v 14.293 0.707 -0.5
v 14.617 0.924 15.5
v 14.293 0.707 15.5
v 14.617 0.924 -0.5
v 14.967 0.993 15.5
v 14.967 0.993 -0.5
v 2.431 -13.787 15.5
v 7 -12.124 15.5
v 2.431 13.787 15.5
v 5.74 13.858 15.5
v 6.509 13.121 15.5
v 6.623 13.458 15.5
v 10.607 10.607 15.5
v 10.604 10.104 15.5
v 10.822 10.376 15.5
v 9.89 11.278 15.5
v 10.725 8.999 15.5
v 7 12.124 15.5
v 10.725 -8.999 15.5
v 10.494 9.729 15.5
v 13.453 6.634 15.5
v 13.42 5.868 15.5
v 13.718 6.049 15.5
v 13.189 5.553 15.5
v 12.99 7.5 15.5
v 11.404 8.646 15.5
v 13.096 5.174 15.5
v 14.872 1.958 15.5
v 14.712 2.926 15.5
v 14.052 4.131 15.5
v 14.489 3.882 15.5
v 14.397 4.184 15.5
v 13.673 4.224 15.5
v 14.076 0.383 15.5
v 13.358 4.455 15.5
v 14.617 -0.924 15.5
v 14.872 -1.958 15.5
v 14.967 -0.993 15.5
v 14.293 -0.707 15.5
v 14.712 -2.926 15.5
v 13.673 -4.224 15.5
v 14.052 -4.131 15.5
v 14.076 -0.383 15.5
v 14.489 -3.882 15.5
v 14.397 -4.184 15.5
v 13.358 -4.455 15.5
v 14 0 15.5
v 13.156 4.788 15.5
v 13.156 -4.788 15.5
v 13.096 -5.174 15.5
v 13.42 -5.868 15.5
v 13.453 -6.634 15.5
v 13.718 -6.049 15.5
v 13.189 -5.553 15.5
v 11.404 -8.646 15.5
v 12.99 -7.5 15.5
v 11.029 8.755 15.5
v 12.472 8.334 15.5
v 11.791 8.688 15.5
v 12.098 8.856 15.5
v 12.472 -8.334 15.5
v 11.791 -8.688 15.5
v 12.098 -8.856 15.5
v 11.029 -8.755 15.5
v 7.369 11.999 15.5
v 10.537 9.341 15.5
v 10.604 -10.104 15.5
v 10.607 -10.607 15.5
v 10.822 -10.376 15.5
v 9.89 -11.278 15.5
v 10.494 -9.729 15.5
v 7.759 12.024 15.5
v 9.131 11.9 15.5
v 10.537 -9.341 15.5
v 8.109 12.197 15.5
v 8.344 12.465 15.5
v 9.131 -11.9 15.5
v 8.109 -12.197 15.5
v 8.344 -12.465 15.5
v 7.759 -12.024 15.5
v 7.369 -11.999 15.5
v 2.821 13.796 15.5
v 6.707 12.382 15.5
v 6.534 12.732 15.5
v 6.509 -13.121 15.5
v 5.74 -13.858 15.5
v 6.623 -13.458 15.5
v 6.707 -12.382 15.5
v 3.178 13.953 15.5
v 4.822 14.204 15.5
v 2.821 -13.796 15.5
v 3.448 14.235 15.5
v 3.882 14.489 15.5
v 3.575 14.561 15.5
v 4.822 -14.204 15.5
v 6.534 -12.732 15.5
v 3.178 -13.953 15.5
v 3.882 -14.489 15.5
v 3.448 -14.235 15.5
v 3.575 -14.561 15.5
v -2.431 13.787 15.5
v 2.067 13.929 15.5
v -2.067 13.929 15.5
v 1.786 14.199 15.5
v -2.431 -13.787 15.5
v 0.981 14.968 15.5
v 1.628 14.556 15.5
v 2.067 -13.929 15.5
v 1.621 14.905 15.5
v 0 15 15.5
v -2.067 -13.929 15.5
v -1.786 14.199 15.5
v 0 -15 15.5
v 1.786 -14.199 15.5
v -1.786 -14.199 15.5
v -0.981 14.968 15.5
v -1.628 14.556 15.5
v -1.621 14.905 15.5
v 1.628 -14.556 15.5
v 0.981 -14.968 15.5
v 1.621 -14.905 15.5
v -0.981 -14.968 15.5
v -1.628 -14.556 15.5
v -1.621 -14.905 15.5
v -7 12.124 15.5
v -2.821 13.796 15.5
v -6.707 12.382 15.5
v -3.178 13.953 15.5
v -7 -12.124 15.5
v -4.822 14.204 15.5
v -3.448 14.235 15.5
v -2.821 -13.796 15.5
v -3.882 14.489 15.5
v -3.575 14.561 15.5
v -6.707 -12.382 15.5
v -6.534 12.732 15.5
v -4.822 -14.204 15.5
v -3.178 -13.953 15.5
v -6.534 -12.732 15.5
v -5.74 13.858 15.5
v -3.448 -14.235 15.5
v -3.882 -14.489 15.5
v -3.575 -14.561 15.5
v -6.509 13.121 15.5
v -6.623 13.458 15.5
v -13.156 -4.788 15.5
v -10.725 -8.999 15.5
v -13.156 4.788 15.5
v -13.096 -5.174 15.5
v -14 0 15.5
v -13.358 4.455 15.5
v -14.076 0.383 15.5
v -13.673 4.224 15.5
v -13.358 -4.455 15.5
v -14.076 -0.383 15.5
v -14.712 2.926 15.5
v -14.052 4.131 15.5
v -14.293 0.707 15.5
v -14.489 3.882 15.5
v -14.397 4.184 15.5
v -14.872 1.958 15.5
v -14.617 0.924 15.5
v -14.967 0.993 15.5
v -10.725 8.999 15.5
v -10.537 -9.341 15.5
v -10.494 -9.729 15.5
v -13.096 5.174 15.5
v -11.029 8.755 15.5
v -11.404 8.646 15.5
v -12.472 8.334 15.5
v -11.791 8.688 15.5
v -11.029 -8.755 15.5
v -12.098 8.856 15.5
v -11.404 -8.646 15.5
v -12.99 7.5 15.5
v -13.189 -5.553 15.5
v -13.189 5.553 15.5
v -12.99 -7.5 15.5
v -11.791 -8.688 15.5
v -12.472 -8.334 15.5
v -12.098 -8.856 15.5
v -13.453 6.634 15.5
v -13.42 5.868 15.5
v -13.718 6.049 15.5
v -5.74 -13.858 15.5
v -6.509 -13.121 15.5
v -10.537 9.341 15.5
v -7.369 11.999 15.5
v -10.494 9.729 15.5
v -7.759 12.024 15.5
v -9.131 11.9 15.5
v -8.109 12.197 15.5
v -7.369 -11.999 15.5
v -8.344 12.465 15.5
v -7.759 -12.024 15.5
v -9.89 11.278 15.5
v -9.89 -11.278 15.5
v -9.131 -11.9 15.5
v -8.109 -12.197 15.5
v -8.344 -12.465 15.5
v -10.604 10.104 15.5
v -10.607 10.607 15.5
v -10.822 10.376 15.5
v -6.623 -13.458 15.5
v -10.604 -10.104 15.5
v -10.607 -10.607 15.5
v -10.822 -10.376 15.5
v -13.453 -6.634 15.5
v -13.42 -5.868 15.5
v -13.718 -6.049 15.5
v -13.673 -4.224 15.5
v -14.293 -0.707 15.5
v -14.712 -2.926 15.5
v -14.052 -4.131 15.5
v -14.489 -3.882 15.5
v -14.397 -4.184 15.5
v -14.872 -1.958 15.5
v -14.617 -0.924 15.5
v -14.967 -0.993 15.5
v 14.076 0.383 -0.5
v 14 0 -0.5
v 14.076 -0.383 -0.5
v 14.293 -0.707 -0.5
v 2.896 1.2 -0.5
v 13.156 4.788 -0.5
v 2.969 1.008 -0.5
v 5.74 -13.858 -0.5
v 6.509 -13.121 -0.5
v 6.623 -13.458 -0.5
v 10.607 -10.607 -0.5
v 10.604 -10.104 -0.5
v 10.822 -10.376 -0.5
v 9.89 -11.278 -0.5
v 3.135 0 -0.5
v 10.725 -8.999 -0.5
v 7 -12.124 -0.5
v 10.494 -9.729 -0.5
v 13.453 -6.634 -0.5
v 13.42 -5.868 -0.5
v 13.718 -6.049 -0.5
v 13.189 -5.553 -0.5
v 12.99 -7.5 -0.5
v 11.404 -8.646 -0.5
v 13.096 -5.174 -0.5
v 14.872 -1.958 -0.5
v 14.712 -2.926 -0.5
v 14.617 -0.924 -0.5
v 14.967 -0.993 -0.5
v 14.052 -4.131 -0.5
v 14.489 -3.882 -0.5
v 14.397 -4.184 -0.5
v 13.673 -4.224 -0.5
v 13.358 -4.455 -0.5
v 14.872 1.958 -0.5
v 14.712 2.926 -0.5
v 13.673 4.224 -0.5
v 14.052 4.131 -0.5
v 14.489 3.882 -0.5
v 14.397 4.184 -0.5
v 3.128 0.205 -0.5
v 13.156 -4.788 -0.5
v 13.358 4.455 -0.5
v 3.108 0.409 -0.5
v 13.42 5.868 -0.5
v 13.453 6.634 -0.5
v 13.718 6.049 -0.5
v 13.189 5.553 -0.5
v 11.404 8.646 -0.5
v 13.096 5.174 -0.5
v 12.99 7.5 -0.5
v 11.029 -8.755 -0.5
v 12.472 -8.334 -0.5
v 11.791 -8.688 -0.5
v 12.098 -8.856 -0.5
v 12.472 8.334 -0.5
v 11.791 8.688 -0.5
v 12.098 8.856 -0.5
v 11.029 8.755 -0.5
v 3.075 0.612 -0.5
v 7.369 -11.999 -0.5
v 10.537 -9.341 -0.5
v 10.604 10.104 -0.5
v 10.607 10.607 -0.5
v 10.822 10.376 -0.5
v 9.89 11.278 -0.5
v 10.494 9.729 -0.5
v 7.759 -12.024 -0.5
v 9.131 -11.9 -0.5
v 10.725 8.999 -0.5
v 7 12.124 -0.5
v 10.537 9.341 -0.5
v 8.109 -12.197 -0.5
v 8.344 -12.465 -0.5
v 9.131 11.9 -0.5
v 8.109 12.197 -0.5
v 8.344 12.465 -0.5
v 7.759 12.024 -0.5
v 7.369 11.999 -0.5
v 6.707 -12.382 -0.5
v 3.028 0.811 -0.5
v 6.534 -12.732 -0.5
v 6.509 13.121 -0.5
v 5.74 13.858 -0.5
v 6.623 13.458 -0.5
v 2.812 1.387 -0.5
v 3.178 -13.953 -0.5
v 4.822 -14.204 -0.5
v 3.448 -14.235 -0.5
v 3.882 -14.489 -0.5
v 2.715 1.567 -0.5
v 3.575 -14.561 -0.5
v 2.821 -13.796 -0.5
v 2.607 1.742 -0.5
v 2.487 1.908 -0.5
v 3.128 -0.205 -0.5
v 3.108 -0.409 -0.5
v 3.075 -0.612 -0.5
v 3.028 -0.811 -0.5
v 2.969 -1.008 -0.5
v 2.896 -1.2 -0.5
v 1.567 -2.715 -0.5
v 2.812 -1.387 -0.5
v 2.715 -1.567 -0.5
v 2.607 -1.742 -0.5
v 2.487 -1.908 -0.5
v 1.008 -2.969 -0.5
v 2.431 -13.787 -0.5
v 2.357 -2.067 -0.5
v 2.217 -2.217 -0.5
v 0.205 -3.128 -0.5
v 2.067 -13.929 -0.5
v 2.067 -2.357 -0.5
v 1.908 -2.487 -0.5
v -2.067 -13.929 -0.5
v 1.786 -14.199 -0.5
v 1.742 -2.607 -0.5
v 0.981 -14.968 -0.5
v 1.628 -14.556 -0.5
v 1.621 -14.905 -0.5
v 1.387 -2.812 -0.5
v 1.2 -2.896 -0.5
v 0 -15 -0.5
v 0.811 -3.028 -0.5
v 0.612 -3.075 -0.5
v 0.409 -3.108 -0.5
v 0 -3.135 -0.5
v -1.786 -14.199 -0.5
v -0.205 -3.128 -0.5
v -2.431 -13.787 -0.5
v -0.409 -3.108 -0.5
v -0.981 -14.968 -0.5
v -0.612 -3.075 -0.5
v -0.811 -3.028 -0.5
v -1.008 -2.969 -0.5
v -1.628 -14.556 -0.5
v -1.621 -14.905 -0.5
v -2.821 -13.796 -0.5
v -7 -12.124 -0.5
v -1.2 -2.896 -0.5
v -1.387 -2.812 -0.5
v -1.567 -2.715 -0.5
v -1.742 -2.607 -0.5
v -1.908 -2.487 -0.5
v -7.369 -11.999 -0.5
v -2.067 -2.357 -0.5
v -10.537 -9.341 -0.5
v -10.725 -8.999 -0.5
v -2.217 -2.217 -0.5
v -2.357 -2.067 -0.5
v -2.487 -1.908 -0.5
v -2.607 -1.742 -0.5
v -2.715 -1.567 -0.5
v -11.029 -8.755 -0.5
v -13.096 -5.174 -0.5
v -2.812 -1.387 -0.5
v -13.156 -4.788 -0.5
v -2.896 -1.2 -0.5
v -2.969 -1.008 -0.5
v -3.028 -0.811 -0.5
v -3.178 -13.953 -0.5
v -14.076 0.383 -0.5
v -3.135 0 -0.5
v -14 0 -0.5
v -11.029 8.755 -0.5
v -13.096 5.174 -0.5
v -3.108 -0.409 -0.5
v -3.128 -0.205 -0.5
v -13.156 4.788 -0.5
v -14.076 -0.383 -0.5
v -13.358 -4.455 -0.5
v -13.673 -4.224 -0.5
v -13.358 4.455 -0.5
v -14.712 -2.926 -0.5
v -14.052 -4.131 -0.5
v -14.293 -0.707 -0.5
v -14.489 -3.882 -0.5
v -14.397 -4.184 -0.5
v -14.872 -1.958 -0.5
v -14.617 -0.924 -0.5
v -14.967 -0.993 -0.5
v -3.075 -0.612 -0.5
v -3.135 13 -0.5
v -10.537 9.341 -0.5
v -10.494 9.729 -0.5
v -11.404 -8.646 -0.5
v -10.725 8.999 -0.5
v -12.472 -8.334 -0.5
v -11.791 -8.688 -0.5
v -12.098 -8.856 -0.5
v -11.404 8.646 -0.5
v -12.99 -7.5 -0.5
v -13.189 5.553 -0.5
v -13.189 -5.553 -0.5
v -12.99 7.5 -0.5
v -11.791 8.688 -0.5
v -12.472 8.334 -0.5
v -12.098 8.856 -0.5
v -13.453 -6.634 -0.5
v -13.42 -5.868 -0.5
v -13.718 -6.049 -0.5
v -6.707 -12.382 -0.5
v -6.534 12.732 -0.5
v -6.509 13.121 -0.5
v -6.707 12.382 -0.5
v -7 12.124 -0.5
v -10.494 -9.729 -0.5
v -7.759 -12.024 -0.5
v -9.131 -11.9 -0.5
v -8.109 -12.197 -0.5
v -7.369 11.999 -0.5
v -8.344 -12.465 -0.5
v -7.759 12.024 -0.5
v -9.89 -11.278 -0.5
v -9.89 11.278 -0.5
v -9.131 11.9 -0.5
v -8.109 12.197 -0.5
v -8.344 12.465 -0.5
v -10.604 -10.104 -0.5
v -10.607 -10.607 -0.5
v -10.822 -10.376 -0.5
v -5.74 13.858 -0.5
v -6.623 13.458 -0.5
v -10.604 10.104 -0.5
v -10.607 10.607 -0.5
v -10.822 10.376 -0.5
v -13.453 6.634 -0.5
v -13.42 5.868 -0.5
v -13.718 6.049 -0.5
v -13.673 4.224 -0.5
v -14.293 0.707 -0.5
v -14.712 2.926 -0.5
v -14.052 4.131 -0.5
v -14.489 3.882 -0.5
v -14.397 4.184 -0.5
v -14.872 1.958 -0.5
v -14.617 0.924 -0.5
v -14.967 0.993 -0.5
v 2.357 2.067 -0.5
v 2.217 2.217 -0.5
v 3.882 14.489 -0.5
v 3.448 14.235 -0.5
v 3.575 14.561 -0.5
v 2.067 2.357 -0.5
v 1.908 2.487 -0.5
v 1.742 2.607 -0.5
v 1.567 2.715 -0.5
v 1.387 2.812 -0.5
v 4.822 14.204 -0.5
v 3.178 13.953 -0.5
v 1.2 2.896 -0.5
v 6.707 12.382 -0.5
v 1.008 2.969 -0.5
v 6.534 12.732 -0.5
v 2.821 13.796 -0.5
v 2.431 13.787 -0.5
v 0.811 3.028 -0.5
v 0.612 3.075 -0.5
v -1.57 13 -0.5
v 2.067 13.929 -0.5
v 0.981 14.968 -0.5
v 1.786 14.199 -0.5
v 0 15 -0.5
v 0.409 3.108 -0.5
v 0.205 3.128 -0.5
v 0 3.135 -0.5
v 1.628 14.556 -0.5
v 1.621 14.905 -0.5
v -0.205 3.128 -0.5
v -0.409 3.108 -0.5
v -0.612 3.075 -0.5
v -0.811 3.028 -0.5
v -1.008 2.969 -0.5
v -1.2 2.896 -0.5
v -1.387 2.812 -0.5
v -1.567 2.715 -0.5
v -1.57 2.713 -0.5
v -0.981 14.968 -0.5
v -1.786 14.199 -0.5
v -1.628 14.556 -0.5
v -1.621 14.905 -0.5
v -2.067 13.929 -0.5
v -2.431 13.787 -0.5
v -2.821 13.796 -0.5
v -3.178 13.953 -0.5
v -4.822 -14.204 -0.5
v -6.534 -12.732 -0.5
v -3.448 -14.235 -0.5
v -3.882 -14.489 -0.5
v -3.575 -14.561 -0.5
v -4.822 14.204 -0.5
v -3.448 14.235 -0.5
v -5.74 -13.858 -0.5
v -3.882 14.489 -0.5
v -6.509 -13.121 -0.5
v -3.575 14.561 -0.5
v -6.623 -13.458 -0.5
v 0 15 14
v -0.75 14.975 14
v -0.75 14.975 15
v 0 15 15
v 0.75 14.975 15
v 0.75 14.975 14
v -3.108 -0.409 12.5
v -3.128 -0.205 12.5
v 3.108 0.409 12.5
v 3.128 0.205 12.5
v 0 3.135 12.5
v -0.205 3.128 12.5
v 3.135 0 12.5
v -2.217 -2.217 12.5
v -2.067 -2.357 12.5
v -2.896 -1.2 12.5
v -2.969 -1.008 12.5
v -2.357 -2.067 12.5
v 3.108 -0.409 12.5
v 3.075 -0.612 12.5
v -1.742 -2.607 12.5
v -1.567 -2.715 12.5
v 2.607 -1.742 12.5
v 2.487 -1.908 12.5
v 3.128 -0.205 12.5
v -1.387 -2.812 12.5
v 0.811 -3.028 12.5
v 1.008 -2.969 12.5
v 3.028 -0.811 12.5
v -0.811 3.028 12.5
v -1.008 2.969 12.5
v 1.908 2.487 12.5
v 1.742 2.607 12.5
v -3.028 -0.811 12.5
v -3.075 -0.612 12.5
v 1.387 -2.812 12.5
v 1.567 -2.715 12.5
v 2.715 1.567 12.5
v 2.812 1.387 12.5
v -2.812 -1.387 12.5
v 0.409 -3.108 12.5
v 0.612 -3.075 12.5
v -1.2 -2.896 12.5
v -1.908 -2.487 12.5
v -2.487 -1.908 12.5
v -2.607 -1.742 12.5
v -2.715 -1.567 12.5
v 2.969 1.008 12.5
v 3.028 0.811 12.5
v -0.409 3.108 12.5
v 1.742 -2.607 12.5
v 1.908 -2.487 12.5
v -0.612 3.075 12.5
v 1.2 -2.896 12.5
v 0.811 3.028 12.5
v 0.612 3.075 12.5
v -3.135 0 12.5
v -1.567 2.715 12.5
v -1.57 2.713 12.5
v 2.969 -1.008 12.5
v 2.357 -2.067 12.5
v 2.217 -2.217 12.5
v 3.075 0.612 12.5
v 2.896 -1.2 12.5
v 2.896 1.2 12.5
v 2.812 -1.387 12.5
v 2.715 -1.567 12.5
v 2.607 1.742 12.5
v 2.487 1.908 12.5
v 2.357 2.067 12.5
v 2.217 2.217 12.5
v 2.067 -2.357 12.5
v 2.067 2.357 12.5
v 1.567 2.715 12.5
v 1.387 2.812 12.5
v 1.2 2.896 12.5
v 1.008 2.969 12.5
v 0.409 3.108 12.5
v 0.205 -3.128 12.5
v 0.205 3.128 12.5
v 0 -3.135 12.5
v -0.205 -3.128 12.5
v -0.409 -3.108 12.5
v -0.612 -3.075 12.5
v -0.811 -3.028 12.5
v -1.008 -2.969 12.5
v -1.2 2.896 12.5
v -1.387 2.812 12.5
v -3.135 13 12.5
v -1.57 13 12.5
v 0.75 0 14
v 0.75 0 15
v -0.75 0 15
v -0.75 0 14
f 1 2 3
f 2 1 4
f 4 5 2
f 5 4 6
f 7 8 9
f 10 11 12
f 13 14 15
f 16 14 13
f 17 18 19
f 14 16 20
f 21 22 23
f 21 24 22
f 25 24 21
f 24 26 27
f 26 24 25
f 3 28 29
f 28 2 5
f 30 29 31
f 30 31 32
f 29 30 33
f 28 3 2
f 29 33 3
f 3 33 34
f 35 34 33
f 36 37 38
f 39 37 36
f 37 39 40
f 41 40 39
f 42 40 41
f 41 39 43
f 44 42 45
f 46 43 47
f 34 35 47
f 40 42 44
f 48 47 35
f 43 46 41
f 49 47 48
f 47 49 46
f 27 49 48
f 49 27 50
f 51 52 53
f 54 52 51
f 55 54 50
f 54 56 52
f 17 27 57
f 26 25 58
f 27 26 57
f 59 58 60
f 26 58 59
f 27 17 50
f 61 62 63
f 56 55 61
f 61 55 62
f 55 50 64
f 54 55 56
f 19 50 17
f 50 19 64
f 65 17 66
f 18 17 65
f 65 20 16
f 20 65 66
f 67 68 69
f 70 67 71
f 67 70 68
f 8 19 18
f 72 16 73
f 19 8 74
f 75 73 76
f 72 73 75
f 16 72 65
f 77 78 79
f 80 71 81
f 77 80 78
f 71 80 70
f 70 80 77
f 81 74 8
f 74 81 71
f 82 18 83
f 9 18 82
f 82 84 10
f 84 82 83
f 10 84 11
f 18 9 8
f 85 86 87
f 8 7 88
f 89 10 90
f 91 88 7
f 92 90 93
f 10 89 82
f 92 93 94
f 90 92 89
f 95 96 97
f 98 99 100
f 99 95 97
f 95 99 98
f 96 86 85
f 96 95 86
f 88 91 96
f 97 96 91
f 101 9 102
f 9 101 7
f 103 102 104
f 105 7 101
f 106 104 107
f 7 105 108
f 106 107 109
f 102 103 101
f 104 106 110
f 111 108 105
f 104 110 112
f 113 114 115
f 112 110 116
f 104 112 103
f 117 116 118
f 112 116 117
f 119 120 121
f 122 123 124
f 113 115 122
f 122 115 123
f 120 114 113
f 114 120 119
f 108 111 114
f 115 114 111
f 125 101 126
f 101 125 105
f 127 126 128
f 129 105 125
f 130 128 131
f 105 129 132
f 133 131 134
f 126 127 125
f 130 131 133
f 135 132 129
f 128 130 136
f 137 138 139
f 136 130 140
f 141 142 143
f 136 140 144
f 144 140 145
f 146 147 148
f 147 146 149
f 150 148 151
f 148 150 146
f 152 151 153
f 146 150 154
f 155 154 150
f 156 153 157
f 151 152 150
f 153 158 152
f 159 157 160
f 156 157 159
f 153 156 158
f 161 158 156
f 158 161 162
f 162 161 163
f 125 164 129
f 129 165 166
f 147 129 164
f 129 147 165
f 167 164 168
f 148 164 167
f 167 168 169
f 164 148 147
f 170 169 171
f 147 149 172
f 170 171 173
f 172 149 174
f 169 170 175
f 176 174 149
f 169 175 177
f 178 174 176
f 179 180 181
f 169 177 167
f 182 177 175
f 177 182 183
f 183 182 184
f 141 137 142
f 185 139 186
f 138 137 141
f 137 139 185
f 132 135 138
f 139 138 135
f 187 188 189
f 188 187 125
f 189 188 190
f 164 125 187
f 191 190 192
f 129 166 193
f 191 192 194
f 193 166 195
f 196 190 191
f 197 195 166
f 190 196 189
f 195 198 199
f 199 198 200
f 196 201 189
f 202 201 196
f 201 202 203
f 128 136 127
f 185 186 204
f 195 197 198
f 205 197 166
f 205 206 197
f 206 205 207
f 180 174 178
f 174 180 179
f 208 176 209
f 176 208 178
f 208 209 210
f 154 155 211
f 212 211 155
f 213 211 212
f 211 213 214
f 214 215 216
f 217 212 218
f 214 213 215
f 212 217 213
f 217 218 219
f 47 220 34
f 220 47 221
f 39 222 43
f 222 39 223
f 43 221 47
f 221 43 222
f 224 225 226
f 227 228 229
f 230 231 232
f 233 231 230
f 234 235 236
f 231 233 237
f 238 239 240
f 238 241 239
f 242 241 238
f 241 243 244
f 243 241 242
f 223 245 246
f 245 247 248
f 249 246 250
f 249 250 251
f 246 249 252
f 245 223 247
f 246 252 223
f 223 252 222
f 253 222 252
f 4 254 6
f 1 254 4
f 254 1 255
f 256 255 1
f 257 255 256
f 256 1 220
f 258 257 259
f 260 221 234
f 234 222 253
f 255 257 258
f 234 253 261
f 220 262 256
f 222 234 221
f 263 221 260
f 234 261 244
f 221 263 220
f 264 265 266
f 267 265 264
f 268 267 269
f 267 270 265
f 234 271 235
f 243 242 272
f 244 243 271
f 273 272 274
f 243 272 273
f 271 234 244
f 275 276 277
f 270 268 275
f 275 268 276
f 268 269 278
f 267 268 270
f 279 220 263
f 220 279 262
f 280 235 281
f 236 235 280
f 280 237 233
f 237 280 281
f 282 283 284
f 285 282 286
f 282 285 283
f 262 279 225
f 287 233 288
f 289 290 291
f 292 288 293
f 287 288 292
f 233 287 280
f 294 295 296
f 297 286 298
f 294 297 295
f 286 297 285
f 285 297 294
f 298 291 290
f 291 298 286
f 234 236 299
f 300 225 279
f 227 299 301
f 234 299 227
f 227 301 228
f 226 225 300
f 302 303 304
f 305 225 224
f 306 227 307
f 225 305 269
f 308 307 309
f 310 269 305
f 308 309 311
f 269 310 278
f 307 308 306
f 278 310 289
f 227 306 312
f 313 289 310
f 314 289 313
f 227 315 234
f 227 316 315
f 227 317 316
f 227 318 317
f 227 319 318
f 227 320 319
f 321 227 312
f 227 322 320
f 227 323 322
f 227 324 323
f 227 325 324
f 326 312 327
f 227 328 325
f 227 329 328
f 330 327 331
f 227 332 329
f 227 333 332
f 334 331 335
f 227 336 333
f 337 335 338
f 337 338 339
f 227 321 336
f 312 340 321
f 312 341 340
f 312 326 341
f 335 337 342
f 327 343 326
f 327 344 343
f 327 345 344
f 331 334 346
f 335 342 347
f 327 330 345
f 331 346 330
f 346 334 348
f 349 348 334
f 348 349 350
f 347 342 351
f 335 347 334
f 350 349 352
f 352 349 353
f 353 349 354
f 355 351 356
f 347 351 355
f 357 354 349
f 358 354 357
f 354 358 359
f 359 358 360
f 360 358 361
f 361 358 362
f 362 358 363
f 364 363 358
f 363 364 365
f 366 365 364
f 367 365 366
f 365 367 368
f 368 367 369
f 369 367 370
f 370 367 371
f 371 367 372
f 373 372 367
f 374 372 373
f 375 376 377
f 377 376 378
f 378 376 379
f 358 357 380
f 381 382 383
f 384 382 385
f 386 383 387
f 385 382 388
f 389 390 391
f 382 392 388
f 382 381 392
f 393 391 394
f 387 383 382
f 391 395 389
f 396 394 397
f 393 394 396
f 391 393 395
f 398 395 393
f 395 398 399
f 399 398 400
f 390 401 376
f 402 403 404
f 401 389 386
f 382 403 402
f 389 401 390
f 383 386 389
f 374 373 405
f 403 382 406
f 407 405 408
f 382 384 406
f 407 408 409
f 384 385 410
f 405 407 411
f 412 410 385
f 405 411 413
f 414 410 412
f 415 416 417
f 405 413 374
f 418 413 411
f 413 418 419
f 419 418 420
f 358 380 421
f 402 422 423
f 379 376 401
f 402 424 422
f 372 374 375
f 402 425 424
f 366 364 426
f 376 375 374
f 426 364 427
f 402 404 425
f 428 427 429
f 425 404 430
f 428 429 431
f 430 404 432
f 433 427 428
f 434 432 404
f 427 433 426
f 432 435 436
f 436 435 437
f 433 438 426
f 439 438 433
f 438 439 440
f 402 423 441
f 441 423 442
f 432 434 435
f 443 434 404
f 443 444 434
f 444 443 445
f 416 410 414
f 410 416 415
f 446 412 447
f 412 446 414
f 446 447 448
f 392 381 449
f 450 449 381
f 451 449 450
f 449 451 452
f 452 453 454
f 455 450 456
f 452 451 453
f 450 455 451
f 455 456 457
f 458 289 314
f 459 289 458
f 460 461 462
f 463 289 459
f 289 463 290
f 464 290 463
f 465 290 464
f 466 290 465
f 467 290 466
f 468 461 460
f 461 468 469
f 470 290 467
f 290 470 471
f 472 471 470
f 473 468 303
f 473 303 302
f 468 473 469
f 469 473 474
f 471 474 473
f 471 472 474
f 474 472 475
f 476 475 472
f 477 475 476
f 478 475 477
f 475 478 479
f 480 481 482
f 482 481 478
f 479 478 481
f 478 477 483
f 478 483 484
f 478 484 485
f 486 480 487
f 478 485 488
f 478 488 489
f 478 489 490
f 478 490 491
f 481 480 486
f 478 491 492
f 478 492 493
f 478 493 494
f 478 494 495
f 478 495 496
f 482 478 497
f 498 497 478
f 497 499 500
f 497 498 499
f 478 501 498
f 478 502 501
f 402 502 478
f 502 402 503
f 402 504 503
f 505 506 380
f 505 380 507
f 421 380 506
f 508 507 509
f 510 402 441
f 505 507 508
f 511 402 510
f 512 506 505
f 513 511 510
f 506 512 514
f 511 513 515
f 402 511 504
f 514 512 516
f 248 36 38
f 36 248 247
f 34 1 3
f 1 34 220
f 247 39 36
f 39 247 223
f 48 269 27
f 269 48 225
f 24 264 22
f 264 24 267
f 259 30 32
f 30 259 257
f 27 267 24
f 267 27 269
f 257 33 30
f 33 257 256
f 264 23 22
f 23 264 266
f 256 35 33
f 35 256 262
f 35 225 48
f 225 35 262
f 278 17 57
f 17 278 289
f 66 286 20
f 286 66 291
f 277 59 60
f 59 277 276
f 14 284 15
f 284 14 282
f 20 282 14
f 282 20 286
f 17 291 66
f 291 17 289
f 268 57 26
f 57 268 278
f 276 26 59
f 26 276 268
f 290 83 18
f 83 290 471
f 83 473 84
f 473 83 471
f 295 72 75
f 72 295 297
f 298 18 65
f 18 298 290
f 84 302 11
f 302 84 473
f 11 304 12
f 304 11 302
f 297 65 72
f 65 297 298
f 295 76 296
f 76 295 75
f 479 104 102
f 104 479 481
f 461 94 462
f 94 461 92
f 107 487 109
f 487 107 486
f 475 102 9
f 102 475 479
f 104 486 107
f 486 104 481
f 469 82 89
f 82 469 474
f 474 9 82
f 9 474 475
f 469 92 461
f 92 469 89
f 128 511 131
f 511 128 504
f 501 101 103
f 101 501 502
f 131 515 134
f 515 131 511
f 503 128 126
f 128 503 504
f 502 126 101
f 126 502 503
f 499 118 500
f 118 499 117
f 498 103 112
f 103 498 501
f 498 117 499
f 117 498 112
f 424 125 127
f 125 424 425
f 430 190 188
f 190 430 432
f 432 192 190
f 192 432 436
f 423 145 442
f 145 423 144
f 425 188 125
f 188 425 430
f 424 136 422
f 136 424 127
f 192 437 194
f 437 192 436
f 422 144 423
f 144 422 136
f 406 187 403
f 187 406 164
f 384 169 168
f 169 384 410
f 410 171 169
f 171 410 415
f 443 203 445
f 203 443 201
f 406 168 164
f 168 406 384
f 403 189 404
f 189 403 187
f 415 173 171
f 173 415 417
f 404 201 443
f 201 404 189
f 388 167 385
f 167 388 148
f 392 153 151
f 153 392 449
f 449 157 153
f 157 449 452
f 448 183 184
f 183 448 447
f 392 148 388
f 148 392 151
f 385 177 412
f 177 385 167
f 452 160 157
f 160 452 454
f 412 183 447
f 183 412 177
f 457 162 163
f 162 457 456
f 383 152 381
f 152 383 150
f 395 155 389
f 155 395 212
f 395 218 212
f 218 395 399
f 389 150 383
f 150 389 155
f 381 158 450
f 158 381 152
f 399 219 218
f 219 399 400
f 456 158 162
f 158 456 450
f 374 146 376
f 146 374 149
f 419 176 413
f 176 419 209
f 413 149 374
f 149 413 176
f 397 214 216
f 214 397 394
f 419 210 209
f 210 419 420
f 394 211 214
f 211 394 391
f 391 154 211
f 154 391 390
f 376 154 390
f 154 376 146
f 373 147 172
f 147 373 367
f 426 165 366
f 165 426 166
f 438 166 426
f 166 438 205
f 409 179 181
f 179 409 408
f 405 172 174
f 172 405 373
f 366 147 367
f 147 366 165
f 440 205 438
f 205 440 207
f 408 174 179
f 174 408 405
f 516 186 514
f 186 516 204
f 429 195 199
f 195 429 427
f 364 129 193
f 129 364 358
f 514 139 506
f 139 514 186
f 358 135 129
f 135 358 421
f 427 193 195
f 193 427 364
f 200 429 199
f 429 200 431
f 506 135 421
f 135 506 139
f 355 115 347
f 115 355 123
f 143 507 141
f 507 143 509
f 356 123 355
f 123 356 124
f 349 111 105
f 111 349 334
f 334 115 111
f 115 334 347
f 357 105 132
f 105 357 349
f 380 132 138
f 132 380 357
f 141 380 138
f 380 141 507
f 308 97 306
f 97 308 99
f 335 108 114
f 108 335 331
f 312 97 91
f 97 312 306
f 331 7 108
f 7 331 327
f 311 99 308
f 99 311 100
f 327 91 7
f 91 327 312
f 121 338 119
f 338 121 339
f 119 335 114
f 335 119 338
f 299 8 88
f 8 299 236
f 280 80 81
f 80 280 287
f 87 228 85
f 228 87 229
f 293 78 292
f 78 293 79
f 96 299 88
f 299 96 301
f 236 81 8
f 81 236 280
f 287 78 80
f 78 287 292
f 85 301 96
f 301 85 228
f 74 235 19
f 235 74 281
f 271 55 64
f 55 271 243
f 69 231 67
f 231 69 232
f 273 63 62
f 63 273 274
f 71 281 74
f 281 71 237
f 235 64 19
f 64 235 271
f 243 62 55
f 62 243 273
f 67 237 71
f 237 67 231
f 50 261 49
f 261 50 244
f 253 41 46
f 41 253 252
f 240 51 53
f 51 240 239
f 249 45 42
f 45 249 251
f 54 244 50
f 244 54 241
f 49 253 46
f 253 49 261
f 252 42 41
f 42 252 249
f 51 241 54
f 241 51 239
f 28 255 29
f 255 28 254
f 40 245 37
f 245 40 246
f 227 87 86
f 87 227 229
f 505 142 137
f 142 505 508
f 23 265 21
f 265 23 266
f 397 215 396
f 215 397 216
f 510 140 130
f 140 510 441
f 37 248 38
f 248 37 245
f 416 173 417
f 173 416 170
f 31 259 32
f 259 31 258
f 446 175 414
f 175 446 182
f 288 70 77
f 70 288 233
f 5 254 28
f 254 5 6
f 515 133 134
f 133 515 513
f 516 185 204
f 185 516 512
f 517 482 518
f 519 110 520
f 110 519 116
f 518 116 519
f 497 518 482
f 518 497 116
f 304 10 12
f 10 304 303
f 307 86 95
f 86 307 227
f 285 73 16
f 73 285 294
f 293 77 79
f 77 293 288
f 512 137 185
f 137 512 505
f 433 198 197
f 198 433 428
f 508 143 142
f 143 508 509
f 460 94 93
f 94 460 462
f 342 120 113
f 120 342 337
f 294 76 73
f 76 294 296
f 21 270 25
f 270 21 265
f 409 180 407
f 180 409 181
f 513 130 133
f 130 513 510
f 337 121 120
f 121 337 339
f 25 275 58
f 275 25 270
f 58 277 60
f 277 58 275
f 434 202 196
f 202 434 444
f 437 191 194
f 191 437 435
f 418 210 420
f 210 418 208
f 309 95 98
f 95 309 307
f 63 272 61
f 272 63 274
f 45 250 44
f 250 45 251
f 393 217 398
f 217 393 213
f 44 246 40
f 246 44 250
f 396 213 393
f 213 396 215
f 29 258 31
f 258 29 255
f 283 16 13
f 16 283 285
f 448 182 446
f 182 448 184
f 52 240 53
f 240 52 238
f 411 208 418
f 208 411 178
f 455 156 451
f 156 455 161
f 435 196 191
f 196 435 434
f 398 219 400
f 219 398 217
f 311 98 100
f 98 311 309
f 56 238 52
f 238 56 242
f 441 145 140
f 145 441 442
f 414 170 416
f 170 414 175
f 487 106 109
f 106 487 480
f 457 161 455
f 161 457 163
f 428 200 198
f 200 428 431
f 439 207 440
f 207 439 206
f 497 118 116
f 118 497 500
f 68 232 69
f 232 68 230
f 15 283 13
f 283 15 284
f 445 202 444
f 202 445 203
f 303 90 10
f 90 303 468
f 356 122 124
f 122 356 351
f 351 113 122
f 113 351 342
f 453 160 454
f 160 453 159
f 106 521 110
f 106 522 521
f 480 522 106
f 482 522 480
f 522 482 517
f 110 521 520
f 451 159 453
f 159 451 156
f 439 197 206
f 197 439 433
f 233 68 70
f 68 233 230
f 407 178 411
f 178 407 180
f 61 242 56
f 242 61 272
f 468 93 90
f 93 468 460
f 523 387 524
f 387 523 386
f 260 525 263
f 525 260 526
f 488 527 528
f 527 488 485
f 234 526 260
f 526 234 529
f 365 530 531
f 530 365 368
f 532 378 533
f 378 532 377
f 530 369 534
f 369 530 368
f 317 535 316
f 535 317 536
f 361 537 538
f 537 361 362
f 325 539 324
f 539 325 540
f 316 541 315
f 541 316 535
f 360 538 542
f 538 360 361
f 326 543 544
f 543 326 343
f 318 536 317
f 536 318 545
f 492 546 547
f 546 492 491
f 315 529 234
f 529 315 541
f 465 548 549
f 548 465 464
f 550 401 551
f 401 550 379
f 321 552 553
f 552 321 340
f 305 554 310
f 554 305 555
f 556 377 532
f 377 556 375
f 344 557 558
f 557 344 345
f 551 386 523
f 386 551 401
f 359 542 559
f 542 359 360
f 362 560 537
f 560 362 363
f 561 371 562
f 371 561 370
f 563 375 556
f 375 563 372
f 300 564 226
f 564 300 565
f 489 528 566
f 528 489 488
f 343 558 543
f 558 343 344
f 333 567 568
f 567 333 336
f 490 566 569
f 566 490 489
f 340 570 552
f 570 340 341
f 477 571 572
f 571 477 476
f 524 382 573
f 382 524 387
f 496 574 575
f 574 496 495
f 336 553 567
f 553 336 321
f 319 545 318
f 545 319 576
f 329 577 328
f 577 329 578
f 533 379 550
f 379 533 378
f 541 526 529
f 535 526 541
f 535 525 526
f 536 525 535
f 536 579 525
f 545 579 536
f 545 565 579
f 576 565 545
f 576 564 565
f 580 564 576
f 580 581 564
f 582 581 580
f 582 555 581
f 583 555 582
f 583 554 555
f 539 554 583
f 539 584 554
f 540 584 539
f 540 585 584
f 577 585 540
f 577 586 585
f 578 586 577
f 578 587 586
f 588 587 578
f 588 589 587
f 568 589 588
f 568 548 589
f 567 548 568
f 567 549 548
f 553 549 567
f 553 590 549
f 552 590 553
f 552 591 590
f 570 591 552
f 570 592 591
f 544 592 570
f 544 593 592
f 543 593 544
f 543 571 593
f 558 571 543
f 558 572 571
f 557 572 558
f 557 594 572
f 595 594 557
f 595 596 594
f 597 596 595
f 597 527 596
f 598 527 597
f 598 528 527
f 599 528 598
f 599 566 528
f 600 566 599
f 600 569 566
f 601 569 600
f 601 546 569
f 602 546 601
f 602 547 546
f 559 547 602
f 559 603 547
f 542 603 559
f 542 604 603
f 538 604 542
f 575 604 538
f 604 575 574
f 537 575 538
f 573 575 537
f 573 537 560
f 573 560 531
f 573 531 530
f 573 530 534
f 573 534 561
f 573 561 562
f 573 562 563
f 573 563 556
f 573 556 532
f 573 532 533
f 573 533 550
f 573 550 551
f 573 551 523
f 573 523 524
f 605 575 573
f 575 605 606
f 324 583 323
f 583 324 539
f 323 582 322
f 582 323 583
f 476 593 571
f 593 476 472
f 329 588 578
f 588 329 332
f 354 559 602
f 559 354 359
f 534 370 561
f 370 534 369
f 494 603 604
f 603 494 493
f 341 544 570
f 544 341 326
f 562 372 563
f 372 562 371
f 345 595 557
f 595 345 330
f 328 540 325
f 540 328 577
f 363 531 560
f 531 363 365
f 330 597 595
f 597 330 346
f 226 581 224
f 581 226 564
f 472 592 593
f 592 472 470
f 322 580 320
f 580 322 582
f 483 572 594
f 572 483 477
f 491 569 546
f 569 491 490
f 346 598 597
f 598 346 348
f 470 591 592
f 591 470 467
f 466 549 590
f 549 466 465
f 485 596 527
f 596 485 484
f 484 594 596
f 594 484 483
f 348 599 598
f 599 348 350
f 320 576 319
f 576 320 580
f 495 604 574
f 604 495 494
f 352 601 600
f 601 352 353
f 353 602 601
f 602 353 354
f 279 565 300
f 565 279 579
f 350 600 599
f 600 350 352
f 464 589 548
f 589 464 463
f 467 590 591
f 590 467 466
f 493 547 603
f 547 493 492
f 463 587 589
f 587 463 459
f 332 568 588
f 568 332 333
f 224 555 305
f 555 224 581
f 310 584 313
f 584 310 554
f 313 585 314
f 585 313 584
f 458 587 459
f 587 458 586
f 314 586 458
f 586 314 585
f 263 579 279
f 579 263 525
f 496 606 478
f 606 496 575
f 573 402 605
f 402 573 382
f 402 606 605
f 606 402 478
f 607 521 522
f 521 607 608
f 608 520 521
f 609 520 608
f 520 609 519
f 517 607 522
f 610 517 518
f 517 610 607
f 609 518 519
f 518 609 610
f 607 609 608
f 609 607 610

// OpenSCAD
// Replacement knob for a hotplate stirrer with a 6 mm D-shaft
// Print orientation: bottom face (facing the hotplate) on the bed at z = 0

// ---------------- Parameters ----------------
knob_d      = 30;    // knob outer diameter (mm)
knob_h      = 15;    // knob height (mm)

bore_depth  = 12;    // D-bore depth from bottom face (mm)
bore_w      = 4.7;   // D-bore width: flat to opposite side of circle (mm)
bore_r      = bore_w / 2 + 0.785; // radius of the circle the D is drawn on (mm)

groove_n    = 18;    // number of vertical grip grooves
groove_d    = 2;     // grip groove diameter (mm)

pointer_w   = 1.5;   // pointer groove width (mm)
pointer_d   = 1;     // pointer groove depth (mm)

eps         = 0.5;   // overcut so cutting faces are not coplanar (mm)

$fn = 96;            // circle resolution

// ---------------- Model ----------------
difference() {
    // Main body: cylinder, centred on origin, resting on z = 0
    translate([0, 0, -eps])
        cylinder(d = knob_d, h = knob_h + 2 * eps);

    // D-shaped blind bore from the bottom face, extending past z = 0
    // The circle is centred on the origin; the flat is at x = -bore_r,
    // so the distance from the flat to the opposite side is exactly bore_w.
    translate([0, 0, -eps])
        linear_extrude(height = bore_depth + 2 * eps)
            circle(r = bore_r);
    translate([-bore_r, 0, -eps])
        cube([bore_w - bore_r, bore_depth + 2 * eps, bore_depth + 2 * eps]);

    // 18 evenly spaced vertical grip grooves along the full height
    for (i = [0 : groove_n - 1])
        rotate([0, 0, i * 360 / groove_n])
            translate([knob_d / 2, 0, -eps])
                cylinder(d = groove_d, h = knob_h + 2 * eps, $fn = 16);

    // Pointer groove on the top face, on the same side as the D's flat
    translate([-pointer_w / 2, 0, knob_h - pointer_d])
        cube([pointer_w, knob_d / 2 + eps, pointer_d]);
}
